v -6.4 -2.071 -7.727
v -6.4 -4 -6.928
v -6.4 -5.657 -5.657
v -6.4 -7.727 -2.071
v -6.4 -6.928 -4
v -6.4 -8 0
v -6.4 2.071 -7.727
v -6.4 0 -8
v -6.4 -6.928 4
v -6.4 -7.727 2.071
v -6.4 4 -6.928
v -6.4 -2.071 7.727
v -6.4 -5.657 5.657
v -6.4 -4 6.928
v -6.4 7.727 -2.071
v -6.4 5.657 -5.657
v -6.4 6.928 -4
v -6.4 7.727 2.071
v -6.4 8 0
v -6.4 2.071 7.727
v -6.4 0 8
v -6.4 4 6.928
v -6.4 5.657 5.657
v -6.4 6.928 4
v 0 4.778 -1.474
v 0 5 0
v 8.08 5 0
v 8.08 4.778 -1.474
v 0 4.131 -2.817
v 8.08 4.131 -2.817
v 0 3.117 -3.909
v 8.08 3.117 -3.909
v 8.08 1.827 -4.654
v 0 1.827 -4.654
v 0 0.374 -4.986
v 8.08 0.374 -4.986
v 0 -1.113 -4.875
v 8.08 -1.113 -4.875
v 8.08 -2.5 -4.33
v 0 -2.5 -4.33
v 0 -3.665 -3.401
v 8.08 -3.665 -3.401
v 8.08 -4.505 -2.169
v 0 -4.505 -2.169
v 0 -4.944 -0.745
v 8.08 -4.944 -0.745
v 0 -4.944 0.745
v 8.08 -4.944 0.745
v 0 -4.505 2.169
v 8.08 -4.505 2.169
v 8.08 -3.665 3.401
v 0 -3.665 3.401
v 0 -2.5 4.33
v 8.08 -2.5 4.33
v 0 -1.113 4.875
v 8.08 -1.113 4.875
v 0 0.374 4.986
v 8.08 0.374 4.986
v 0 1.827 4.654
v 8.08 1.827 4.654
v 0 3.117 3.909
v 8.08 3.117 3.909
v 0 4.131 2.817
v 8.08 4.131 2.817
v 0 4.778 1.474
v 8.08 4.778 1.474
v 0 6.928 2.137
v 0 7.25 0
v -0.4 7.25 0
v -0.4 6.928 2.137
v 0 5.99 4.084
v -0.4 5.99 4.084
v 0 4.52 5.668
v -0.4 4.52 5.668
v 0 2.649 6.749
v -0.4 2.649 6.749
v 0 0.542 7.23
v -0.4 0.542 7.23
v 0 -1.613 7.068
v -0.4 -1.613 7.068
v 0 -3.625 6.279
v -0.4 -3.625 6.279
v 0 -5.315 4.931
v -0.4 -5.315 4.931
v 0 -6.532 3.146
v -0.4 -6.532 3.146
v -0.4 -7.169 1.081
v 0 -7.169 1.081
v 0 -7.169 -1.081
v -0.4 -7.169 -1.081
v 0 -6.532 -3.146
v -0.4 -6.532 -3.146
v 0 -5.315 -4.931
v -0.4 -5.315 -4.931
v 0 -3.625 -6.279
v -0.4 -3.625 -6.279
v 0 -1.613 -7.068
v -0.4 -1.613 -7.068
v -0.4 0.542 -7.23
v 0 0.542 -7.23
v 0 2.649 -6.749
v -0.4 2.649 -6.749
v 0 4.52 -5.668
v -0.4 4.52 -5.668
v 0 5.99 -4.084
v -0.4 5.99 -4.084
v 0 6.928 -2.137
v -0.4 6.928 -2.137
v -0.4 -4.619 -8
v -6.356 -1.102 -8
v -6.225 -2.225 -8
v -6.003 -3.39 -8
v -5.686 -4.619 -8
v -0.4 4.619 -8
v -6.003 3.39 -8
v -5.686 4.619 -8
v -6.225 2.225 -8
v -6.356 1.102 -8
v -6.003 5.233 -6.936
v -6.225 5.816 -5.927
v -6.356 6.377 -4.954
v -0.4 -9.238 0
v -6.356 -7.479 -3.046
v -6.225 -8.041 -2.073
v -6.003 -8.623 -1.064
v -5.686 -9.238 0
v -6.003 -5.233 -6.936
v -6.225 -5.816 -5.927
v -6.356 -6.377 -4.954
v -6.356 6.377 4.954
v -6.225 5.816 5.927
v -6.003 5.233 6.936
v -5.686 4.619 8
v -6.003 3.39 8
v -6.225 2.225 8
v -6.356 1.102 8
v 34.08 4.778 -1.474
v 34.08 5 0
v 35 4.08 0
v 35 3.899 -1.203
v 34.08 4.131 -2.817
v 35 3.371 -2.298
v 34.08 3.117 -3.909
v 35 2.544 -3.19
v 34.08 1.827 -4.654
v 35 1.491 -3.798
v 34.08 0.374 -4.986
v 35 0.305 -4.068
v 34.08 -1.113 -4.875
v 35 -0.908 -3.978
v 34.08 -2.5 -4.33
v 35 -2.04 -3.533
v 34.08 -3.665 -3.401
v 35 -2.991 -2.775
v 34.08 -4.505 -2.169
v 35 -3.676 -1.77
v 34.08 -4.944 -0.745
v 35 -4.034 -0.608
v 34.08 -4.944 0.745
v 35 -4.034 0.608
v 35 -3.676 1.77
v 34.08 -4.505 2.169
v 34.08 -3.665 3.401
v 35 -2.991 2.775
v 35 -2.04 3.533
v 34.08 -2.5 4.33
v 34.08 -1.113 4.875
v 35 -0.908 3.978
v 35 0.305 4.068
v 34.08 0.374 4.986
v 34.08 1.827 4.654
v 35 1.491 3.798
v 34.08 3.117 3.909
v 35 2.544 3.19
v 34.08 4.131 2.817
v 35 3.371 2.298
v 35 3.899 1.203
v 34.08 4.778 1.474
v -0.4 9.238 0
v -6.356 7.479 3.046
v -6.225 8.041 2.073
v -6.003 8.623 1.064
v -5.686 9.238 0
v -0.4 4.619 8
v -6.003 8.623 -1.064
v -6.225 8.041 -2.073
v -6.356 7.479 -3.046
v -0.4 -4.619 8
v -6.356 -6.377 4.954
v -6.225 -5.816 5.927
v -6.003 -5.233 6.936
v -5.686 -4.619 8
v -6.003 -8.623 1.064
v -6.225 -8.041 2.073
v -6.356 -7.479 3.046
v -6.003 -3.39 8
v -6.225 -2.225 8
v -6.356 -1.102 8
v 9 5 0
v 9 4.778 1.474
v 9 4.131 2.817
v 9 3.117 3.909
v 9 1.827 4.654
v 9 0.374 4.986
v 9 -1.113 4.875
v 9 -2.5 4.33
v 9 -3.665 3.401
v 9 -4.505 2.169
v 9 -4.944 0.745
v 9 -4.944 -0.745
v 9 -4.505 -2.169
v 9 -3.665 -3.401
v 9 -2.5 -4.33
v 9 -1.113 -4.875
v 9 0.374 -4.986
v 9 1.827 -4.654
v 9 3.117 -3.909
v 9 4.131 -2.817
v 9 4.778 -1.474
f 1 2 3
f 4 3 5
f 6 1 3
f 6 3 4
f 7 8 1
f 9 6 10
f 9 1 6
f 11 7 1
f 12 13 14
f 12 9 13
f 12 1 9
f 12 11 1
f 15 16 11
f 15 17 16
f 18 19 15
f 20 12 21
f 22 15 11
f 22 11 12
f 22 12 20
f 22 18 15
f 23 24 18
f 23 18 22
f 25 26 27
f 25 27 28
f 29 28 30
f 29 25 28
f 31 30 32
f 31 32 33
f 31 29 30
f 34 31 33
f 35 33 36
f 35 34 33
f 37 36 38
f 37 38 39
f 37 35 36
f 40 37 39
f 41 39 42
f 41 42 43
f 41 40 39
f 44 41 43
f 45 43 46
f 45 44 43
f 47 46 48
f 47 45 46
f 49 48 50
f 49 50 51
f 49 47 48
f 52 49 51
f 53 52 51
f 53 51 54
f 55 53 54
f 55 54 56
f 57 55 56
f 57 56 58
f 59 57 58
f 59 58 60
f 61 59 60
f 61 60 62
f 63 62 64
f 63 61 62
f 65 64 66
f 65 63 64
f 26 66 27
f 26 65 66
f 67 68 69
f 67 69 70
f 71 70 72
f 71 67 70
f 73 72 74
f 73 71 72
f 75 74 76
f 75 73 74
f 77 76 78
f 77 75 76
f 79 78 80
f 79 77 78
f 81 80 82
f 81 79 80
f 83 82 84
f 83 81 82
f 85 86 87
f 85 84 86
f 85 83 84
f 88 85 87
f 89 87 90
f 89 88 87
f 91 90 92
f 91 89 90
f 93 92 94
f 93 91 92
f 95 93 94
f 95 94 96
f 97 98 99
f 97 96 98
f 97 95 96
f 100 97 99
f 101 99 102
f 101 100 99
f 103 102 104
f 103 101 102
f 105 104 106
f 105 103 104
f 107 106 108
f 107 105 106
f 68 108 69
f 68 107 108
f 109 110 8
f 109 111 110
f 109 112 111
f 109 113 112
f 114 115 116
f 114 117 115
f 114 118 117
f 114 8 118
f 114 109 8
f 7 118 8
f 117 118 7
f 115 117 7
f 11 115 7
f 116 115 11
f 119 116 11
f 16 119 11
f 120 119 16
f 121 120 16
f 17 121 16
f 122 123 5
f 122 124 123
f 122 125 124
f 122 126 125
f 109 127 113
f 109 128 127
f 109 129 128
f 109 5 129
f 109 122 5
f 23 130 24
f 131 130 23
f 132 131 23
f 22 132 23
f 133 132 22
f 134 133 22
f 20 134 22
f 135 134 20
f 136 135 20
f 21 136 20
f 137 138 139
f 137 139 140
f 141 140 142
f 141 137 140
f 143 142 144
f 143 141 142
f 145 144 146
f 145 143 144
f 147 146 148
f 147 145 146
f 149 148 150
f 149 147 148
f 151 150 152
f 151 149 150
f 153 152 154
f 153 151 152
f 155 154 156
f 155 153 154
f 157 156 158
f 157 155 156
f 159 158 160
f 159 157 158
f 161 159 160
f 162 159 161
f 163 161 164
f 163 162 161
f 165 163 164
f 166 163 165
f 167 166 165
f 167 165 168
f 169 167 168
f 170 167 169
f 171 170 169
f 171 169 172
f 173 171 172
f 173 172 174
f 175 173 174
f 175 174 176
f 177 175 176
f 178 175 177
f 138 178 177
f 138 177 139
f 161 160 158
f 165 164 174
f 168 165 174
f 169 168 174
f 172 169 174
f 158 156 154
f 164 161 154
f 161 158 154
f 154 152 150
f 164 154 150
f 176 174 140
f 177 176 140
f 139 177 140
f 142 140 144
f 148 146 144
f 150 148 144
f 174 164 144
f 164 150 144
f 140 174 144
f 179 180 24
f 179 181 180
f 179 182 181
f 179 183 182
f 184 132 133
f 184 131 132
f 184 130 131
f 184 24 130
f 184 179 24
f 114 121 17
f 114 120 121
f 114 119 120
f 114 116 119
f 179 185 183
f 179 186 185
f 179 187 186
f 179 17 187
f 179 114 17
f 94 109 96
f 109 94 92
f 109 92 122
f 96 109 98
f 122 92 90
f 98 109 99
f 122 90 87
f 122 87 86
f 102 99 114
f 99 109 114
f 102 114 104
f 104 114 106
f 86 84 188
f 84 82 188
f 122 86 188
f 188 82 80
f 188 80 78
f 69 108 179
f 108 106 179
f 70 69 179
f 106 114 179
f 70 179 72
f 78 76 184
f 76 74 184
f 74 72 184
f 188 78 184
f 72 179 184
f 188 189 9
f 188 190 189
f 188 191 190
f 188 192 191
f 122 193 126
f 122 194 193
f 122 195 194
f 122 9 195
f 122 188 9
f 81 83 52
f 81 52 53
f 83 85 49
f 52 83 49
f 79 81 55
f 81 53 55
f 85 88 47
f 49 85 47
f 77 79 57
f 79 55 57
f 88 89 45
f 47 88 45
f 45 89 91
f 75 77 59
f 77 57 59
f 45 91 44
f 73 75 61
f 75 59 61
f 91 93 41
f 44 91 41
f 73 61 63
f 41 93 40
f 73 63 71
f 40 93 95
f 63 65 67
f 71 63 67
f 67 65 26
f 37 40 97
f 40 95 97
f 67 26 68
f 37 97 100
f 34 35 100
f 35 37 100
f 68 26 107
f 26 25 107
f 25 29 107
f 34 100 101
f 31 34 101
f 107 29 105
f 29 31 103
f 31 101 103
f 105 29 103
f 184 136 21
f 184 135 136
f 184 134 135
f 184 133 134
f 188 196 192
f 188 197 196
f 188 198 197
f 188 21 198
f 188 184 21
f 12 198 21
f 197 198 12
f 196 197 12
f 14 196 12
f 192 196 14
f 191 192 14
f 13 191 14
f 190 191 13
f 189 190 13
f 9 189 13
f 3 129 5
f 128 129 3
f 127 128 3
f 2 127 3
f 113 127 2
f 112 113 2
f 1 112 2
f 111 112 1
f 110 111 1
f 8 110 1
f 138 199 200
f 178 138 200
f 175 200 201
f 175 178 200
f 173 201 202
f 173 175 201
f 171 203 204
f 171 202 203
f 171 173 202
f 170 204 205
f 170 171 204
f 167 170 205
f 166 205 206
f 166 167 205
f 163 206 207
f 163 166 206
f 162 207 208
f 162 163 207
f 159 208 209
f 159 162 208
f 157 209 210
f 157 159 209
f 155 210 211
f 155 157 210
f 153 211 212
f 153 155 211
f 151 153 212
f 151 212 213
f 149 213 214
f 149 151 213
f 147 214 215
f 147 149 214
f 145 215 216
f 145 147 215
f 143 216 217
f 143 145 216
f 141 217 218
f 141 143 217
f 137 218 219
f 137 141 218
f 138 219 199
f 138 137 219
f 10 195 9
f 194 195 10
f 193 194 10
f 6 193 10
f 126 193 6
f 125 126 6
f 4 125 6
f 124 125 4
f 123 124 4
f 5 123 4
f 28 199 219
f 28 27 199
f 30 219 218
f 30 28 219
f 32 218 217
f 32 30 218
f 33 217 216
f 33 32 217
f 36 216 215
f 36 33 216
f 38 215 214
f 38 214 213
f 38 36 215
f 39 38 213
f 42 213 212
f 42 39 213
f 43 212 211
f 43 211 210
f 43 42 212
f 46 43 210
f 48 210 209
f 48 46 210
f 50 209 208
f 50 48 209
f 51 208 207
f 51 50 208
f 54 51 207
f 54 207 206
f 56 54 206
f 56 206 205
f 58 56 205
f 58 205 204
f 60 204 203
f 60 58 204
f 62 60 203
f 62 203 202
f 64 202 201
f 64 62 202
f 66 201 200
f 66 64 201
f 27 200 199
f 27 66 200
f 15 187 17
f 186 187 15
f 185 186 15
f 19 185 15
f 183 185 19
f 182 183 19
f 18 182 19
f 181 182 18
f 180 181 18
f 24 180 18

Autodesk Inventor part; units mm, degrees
ref_plane "YZ Plane" through (0, 0, 0) normal (1, 0, 0) x (0, 1, 0)
ref_plane "XZ Plane" through (0, 0, 0) normal (0, 1, 0) x (-1, 0, 0)
sketch "草图1" plane through (0, 0, 0) normal (0, 0, 1) x (1, 0, 0)
  line L0 (0, 7.25) -> (0, 5)
  line L1 (9, 5) -> (35, 5)
  line L2 (35, 5) -> (35, 0)
  line L3 (35, 0) -> (-0.4001, 0)
  line L4 (-7.4801, 0) -> (42.08, 0) projected
  line L5 (-0.4001, 0) -> (-0.4001, 7.25)
  line L6 (-0.4001, 7.25) -> (0, 7.25)
  line L7 (9, 5) -> (8.0797, 5)
  line L8 (8.0797, 5) -> (0, 5)
  line L9 (0, -1.45) -> (0, 8.7) projected
  dimension "d0" = 35
  dimension "d1" = 26
  dimension "d2" = 10
  dimension "d9" = 0.4001
  dimension "d10" = 14.5
  dimension "d13" = 0.9203
  dimension "d14" = 10
revolve "轴承体" add sketch "草图1" angle 360 about axis through (35, 0, 0) along (-1, 0, 0)
sketch "草图2" plane through (-0.4001, 0, 0) normal (-1, 0, 0) x (0, 0, 1)
  line L0 (0, 9.2376) -> (8, 4.6188)
  line L1 (8, 4.6188) -> (8, -4.6188)
  line L2 (8, -4.6188) -> (0, -9.2376)
  line L3 (0, -9.2376) -> (-8, -4.6188)
  line L4 (-8, -4.6188) -> (-8, 4.6188)
  line L5 (-8, 4.6188) -> (0, 9.2376)
  point P0 (0, 0)
  point P1 (0, 0)
  dimension "d11" = 16
extrude "头" add sketch "草图2" along normal blind 6
sketch "草图4" plane through (0, 0, 0) normal (0, 0, 1) x (1, 0, 0)
  line L0 (-6.4001, 8) -> (-6.4001, 9.2376)
  line L1 (-6.4001, 9.2376) -> (-5.6856, 9.2376)
  line L2 (-5.6856, 9.2376) -> (-6.4001, 8)
  line L3 (-7.6001, 0) -> (0.7999, 0) projected
  line L4 (-0.4001, 9.2376) -> (-6.4001, 9.2376) projected
  line L5 (-6.4001, 4.6188) -> (-6.4001, 9.2376) projected
  dimension "d5" = 30
  dimension "d19" = 16
revolve "倒角1" cut sketch "草图4" angle 360 about axis through (-10, 0, 0) along (1, 0, 0)
thread "螺纹" size "M10x1.5" designation "M10" class "6g" standard "GB Metric profile" length 26
chamfer "倒角2" distance 0.9202 distance2 0.9203 1 edges at (35, -5, 0) measured on face at (35, -0.8768, 0.3989)
ref_plane "Work Plane1" through (1.525, 0, 0) normal (0, 0, 1) x (1, 0, 0)
equation "\"d11\" = SW"
equation "\"d3\" = KOH - SD"
equation "\"d15\" = GEL"
equation "\"d6\" = -0.5 * SPD + 0.5 * GD"
equation "\"d0\" = NLG"
equation "\"d1\" = GEL"
equation "\"d2\" = GD"
equation "\"d10\" = SD2"
equation "\"d14\" = BDM"
equation "\"d5\" = ANG1"
equation "\"d19\" = SW0"
equation "\"NLG\" = 35"
equation "\"GD\" = NND"
equation "\"BDM\" = NND"
equation "\"KOH\" = 6.4"
equation "\"GEL\" = 26"
equation "\"SW\" = 16"
equation "\"SW0\" = SW"
equation "\"SPD\" = NND - 1.2269 * PTC"
equation "\"SD2\" = SDH"
equation "\"SD\" = WFT"
equation "\"ANG1\" = 30deg"
equation "\"GAL\" = 0.61345 * PTC"
equation "\"GUL\" = 0.61345 * PTC"
equation "\"RR\" = 0.4"
equation "\"WFT\" = 0.4"
equation "\"GD1\" = THREADDIA - 1.2269 * PTC"
equation "\"SDH\" = 14.5"
equation "\"TOA\" = 30deg"
equation "\"FAWI\" = 45deg"
equation "\"PTC\" = 1.5"
equation "\"E0\" = 1.155 * SW"
equation "\"NND\" = 10"
equation "\"THREADDIA\" = 10"
properties part number "螺栓 GB/T 5782 M10 x 35" material "钢，软"
